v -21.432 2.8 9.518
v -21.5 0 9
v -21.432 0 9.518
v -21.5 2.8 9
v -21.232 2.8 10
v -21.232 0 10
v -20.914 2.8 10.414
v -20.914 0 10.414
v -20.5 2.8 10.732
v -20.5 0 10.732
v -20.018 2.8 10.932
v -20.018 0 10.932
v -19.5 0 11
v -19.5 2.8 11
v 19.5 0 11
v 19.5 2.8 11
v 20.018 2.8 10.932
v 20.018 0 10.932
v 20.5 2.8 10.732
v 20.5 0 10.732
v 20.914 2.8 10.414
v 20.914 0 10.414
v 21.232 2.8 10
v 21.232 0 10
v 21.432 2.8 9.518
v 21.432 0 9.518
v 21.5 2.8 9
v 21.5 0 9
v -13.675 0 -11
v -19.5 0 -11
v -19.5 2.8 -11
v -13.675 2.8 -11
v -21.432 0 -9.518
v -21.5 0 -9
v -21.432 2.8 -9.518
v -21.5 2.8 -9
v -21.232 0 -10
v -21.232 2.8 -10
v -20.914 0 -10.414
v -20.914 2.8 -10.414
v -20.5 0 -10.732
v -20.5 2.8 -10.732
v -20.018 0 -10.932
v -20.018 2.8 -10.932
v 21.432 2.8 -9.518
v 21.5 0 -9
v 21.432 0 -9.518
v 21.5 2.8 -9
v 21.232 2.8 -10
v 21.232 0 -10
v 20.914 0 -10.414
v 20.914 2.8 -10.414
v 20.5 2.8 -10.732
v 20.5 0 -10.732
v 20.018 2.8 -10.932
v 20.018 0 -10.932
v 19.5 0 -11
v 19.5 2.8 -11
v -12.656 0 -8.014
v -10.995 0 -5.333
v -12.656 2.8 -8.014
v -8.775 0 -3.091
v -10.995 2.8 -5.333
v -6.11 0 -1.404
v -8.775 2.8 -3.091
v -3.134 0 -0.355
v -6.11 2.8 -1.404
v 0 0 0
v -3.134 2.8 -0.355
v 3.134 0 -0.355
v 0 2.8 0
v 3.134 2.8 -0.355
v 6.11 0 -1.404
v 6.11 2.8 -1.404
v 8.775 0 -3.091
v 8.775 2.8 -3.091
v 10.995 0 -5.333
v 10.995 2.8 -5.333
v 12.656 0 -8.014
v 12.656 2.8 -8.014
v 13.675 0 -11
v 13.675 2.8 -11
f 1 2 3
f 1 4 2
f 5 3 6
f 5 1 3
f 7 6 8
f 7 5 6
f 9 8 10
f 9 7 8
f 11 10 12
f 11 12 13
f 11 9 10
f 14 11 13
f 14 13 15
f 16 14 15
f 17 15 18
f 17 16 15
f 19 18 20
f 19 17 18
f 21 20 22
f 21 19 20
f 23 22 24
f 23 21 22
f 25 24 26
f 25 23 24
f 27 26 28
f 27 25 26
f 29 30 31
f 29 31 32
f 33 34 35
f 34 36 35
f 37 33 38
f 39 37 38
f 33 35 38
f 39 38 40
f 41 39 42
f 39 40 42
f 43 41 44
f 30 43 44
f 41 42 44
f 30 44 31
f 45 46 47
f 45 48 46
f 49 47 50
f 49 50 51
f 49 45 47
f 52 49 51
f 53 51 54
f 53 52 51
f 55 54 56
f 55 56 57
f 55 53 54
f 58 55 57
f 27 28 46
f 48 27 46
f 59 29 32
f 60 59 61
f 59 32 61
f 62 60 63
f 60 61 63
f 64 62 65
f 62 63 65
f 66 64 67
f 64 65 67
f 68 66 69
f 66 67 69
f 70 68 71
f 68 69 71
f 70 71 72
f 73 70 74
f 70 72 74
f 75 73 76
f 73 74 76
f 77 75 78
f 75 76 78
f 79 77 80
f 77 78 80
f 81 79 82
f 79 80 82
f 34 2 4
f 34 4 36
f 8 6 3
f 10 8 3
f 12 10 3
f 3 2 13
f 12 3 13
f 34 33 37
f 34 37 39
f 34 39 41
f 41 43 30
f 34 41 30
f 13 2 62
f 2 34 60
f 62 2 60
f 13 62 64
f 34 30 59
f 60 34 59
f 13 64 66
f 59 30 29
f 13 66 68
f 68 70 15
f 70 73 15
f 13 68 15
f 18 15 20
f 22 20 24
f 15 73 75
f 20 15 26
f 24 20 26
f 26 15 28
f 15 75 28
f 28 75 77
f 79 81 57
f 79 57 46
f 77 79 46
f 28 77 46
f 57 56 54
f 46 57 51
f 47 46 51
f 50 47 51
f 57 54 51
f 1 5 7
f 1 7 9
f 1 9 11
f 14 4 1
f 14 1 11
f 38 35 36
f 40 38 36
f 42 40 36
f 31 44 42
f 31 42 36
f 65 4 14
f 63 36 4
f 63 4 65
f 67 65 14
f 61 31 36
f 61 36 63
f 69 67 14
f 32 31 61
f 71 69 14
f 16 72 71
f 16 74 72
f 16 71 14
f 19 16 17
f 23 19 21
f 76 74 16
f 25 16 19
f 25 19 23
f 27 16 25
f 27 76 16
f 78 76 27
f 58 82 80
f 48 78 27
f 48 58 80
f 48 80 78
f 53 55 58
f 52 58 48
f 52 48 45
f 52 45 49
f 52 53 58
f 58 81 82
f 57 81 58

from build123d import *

# Parameters (mm, degrees)
SKETCH1_W           = 43
SKETCH1_H           = 22
BOSS_EXTRUDE1_DEPTH = 2.8
SKETCH2_R           = 14
CUT_EXTRUDE1_DEPTH  = 25.312342544
FILLET1_R           = 2


with BuildPart() as part:
    # Sketch1 → Boss-Extrude1 (new body)
    with BuildSketch(Plane(origin=(0, 0, 0), x_dir=(1, 0, 0), z_dir=(0, 1, 0))):
        Rectangle(SKETCH1_W, SKETCH1_H)
    extrude(amount=BOSS_EXTRUDE1_DEPTH)

    # Sketch2 → Cut-Extrude1 (cut, through all)
    with BuildSketch(Plane(origin=(0, 2.8, 0), x_dir=(1, 0, 0), z_dir=(0, 1, 0))):
        with Locations((0, 14)):
            Circle(SKETCH2_R)
    extrude(amount=-CUT_EXTRUDE1_DEPTH, mode=Mode.SUBTRACT)

    # Fillet1
    fillet1_edges = [part.edges().sort_by_distance(p)[0] for p in [
        (21.5, 1.4, 11),
        (-21.5, 1.4, 11),
        (-21.5, 1.4, -11),
        (21.5, 1.4, -11),
    ]]
    fillet(fillet1_edges, radius=FILLET1_R)


solid = part.part
